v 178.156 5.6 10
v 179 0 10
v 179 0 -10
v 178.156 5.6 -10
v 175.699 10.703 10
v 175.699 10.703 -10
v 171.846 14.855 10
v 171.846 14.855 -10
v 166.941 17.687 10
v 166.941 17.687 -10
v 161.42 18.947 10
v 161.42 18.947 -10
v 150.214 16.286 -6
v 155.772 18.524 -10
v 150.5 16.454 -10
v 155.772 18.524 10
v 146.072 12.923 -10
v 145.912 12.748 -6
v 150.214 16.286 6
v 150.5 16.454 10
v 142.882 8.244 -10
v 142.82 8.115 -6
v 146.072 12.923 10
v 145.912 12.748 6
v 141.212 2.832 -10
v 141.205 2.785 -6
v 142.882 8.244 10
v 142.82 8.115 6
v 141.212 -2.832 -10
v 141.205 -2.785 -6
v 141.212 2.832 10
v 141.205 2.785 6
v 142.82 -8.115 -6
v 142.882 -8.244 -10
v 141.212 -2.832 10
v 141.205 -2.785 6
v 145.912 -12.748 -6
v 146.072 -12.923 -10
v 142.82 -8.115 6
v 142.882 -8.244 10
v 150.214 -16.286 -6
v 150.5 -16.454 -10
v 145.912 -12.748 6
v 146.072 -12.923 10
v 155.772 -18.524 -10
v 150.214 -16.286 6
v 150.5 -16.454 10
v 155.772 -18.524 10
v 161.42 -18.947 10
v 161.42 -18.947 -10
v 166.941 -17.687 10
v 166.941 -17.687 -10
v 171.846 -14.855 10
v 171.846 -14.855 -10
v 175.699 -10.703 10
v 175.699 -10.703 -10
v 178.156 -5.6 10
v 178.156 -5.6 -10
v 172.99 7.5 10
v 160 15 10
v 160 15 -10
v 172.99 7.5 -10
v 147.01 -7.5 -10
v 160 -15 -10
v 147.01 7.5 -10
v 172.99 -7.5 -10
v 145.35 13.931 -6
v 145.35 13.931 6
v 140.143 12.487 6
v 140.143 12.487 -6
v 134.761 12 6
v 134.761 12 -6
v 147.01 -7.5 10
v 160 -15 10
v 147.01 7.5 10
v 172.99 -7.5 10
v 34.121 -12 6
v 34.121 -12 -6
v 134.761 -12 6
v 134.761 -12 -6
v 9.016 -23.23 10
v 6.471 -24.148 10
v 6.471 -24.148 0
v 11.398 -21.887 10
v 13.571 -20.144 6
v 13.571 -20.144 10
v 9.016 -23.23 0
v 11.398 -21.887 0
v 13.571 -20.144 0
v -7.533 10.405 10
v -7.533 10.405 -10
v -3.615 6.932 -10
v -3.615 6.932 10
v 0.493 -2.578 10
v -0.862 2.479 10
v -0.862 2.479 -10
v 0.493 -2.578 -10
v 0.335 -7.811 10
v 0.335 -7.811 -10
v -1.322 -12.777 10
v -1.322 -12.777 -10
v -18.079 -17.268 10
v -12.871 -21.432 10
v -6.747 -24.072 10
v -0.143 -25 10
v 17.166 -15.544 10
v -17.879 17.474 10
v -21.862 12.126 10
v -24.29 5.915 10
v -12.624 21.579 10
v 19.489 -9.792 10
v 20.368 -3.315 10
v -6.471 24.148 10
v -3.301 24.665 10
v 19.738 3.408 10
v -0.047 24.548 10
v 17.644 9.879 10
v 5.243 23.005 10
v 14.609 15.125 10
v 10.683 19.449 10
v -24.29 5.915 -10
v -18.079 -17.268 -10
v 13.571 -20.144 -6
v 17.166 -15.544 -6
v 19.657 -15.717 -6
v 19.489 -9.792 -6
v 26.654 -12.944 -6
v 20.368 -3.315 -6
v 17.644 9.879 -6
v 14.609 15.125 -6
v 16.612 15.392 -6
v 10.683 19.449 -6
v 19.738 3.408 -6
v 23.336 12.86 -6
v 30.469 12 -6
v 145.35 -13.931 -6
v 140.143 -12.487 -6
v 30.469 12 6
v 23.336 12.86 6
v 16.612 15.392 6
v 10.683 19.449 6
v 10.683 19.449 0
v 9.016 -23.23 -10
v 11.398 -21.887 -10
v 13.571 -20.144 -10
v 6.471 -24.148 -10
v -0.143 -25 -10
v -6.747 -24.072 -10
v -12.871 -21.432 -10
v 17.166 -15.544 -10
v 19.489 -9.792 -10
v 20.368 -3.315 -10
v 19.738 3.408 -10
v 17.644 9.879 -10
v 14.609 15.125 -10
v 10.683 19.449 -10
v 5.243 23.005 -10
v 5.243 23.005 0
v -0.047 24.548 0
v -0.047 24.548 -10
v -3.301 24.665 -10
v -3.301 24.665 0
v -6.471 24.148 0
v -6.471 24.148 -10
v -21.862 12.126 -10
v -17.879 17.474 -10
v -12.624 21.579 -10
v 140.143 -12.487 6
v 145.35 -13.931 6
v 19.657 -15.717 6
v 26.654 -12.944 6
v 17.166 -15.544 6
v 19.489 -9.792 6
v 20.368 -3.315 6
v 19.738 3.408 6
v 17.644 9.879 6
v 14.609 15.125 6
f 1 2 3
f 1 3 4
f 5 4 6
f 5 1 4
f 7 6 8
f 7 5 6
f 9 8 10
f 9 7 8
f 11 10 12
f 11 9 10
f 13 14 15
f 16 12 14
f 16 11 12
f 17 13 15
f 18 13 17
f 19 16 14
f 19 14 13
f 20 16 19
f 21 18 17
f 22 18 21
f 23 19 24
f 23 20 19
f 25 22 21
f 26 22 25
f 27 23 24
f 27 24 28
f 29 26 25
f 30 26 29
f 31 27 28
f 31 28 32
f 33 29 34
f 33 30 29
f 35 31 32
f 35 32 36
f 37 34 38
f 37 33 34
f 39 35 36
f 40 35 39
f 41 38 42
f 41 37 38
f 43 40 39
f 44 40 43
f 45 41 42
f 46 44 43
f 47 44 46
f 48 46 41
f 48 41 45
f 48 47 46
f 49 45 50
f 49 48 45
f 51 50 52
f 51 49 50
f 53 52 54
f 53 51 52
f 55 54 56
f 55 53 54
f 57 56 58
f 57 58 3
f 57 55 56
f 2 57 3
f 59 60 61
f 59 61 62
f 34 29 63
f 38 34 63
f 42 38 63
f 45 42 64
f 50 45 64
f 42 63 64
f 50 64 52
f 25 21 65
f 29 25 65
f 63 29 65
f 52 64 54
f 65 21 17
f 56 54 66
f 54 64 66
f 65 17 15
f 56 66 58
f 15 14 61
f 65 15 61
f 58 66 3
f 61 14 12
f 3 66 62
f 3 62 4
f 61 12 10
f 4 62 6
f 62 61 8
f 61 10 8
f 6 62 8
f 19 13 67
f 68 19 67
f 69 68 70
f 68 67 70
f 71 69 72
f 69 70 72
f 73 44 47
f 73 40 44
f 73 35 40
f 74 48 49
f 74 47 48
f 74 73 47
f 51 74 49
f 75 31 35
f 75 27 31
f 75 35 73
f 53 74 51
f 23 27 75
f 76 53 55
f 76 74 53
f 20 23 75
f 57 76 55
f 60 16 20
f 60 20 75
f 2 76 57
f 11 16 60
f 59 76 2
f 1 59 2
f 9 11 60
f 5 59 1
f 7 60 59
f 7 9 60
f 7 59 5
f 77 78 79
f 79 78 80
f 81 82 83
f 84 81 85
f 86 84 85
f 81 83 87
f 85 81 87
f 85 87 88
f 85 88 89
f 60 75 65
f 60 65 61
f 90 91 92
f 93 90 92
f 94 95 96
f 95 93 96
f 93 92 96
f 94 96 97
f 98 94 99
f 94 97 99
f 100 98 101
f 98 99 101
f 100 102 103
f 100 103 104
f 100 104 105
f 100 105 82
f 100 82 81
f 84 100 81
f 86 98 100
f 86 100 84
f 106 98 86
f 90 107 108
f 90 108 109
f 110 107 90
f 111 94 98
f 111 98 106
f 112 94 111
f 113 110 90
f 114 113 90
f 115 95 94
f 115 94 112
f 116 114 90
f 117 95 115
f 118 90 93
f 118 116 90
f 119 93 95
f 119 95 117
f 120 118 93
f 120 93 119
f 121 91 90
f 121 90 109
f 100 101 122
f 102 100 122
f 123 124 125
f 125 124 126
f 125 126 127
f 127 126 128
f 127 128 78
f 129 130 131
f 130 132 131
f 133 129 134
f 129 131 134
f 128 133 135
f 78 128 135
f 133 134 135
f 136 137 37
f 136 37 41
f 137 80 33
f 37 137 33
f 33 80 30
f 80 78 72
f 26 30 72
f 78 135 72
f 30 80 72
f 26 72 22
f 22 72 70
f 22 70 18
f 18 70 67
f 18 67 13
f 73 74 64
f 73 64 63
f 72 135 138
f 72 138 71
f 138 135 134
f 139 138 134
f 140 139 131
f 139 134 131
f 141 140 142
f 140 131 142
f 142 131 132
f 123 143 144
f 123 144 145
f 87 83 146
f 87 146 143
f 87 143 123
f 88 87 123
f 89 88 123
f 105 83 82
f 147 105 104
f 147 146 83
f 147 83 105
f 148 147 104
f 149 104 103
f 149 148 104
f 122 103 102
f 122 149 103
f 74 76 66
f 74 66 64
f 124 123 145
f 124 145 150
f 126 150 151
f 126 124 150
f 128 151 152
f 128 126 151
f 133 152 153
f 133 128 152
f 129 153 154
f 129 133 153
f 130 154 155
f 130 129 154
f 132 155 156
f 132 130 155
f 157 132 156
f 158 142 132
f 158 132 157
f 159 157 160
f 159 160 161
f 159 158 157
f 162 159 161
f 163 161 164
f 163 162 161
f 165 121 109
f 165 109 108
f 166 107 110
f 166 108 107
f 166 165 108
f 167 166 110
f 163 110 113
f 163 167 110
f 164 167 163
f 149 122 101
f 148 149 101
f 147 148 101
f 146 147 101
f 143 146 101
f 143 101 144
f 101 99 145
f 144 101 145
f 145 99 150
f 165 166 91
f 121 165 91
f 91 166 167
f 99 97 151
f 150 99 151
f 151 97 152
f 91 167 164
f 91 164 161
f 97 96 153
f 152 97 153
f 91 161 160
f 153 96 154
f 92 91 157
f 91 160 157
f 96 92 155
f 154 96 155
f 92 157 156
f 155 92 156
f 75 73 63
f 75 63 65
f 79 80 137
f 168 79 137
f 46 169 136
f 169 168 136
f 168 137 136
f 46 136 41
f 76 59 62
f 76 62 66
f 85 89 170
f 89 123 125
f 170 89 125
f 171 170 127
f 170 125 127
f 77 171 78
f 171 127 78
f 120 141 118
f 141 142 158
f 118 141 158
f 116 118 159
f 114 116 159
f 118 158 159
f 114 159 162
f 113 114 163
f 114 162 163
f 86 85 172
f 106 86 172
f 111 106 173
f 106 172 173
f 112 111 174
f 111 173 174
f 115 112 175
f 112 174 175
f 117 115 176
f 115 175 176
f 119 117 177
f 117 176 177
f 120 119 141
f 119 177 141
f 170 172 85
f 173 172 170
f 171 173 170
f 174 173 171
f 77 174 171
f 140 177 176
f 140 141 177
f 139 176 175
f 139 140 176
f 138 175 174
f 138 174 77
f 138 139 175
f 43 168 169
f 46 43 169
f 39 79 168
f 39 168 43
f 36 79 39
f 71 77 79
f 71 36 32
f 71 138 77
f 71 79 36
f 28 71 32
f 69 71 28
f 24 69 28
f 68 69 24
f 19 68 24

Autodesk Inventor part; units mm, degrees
ref_plane "YZ Plane" through (0, 0, 0) normal (1, 0, 0) x (0, 1, 0)
ref_plane "XZ Plane" through (0, 0, 0) normal (0, 1, 0) x (-1, 0, 0)
ref_plane "XY Plane" through (0, 0, 0) normal (0, 0, 1) x (1, 0, 0)
sketch "Sketch1" plane through (0, 0, 0) normal (0, 0, 1) x (1, 0, 0)
  line L0 (0, 0) -> (0, 114.286) construction
  line L1 (0, 0) -> (-19.7038, 73.5356) construction
  ellipse E0 centre (0, 0) end of major axis (19.3185, 5.1764) minor radius 25 (6.4705, -24.1481) -> (-6.4705, 24.1481) ccw
  arc A0 (-1.3216, -12.7774) -> (-7.5332, 10.4048) centre (-17.3867, -4.6587) ccw
  line L2 (-7.5332, 10.4048) -> (-24.2902, 5.9148)
  line L3 (-1.3216, -12.7774) -> (-18.0786, -17.2675)
  arc A1 (-6.4705, 24.1481) -> (-24.2902, 5.9148) centre (0, 0) ccw
  arc A2 (-18.0786, -17.2675) -> (6.4705, -24.1481) centre (0, 0) ccw
  line L4 (0, 0) -> (160, 0) construction
  line L5 (30.4688, 12) -> (134.7611, 12)
  line L6 (34.1209, -12) -> (134.7611, -12)
  arc A3 (10.6834, 19.4492) -> (31.3482, 12.0129) centre (30.4688, 42) ccw
  arc A4 (34.1209, -12) -> (11.6572, -22.1158) centre (34.1209, -42) ccw
  circle A5 centre (160, 0) radius 19
  line L7 (172.9904, 7.5) -> (172.9904, -7.5)
  line L8 (172.9904, -7.5) -> (160, -15)
  line L9 (160, -15) -> (147.0096, -7.5)
  line L10 (147.0096, -7.5) -> (147.0096, 7.5)
  line L11 (147.0096, 7.5) -> (160, 15)
  line L12 (160, 15) -> (172.9904, 7.5)
  arc A6 (134.7611, 12) -> (150.2135, 16.2857) centre (134.7611, 42) ccw
  arc A7 (150.2135, -16.2857) -> (134.7611, -12) centre (134.7611, -42) ccw
  point P0 (172.9904, 0)
  point P1 (13.5706, -20.144)
  dimension "d12" = 20
  dimension "d14" = 25
  dimension "d19" = 38
  dimension "d7" = 15
  dimension "d10" = 18
  dimension "d13" = 24
  dimension "d15" = 25
  dimension "d16" = 30
  dimension "d17" = 24
  dimension "d18" = 30
  dimension "d20" = 30
  dimension "d21" = 160
  dimension "d23" = 15
extrude "Extrusion1" add sketch "Sketch1" along normal mid plane 20 contours E0 A2 L3 A0 L2 A1 | A5
extrude "Extrusion2" add sketch "Sketch1" along normal mid plane 12 contours A3 L5 A6 A5 A7 L6 A4 E0
properties part number "Co le" material "Steel, Alloy"
